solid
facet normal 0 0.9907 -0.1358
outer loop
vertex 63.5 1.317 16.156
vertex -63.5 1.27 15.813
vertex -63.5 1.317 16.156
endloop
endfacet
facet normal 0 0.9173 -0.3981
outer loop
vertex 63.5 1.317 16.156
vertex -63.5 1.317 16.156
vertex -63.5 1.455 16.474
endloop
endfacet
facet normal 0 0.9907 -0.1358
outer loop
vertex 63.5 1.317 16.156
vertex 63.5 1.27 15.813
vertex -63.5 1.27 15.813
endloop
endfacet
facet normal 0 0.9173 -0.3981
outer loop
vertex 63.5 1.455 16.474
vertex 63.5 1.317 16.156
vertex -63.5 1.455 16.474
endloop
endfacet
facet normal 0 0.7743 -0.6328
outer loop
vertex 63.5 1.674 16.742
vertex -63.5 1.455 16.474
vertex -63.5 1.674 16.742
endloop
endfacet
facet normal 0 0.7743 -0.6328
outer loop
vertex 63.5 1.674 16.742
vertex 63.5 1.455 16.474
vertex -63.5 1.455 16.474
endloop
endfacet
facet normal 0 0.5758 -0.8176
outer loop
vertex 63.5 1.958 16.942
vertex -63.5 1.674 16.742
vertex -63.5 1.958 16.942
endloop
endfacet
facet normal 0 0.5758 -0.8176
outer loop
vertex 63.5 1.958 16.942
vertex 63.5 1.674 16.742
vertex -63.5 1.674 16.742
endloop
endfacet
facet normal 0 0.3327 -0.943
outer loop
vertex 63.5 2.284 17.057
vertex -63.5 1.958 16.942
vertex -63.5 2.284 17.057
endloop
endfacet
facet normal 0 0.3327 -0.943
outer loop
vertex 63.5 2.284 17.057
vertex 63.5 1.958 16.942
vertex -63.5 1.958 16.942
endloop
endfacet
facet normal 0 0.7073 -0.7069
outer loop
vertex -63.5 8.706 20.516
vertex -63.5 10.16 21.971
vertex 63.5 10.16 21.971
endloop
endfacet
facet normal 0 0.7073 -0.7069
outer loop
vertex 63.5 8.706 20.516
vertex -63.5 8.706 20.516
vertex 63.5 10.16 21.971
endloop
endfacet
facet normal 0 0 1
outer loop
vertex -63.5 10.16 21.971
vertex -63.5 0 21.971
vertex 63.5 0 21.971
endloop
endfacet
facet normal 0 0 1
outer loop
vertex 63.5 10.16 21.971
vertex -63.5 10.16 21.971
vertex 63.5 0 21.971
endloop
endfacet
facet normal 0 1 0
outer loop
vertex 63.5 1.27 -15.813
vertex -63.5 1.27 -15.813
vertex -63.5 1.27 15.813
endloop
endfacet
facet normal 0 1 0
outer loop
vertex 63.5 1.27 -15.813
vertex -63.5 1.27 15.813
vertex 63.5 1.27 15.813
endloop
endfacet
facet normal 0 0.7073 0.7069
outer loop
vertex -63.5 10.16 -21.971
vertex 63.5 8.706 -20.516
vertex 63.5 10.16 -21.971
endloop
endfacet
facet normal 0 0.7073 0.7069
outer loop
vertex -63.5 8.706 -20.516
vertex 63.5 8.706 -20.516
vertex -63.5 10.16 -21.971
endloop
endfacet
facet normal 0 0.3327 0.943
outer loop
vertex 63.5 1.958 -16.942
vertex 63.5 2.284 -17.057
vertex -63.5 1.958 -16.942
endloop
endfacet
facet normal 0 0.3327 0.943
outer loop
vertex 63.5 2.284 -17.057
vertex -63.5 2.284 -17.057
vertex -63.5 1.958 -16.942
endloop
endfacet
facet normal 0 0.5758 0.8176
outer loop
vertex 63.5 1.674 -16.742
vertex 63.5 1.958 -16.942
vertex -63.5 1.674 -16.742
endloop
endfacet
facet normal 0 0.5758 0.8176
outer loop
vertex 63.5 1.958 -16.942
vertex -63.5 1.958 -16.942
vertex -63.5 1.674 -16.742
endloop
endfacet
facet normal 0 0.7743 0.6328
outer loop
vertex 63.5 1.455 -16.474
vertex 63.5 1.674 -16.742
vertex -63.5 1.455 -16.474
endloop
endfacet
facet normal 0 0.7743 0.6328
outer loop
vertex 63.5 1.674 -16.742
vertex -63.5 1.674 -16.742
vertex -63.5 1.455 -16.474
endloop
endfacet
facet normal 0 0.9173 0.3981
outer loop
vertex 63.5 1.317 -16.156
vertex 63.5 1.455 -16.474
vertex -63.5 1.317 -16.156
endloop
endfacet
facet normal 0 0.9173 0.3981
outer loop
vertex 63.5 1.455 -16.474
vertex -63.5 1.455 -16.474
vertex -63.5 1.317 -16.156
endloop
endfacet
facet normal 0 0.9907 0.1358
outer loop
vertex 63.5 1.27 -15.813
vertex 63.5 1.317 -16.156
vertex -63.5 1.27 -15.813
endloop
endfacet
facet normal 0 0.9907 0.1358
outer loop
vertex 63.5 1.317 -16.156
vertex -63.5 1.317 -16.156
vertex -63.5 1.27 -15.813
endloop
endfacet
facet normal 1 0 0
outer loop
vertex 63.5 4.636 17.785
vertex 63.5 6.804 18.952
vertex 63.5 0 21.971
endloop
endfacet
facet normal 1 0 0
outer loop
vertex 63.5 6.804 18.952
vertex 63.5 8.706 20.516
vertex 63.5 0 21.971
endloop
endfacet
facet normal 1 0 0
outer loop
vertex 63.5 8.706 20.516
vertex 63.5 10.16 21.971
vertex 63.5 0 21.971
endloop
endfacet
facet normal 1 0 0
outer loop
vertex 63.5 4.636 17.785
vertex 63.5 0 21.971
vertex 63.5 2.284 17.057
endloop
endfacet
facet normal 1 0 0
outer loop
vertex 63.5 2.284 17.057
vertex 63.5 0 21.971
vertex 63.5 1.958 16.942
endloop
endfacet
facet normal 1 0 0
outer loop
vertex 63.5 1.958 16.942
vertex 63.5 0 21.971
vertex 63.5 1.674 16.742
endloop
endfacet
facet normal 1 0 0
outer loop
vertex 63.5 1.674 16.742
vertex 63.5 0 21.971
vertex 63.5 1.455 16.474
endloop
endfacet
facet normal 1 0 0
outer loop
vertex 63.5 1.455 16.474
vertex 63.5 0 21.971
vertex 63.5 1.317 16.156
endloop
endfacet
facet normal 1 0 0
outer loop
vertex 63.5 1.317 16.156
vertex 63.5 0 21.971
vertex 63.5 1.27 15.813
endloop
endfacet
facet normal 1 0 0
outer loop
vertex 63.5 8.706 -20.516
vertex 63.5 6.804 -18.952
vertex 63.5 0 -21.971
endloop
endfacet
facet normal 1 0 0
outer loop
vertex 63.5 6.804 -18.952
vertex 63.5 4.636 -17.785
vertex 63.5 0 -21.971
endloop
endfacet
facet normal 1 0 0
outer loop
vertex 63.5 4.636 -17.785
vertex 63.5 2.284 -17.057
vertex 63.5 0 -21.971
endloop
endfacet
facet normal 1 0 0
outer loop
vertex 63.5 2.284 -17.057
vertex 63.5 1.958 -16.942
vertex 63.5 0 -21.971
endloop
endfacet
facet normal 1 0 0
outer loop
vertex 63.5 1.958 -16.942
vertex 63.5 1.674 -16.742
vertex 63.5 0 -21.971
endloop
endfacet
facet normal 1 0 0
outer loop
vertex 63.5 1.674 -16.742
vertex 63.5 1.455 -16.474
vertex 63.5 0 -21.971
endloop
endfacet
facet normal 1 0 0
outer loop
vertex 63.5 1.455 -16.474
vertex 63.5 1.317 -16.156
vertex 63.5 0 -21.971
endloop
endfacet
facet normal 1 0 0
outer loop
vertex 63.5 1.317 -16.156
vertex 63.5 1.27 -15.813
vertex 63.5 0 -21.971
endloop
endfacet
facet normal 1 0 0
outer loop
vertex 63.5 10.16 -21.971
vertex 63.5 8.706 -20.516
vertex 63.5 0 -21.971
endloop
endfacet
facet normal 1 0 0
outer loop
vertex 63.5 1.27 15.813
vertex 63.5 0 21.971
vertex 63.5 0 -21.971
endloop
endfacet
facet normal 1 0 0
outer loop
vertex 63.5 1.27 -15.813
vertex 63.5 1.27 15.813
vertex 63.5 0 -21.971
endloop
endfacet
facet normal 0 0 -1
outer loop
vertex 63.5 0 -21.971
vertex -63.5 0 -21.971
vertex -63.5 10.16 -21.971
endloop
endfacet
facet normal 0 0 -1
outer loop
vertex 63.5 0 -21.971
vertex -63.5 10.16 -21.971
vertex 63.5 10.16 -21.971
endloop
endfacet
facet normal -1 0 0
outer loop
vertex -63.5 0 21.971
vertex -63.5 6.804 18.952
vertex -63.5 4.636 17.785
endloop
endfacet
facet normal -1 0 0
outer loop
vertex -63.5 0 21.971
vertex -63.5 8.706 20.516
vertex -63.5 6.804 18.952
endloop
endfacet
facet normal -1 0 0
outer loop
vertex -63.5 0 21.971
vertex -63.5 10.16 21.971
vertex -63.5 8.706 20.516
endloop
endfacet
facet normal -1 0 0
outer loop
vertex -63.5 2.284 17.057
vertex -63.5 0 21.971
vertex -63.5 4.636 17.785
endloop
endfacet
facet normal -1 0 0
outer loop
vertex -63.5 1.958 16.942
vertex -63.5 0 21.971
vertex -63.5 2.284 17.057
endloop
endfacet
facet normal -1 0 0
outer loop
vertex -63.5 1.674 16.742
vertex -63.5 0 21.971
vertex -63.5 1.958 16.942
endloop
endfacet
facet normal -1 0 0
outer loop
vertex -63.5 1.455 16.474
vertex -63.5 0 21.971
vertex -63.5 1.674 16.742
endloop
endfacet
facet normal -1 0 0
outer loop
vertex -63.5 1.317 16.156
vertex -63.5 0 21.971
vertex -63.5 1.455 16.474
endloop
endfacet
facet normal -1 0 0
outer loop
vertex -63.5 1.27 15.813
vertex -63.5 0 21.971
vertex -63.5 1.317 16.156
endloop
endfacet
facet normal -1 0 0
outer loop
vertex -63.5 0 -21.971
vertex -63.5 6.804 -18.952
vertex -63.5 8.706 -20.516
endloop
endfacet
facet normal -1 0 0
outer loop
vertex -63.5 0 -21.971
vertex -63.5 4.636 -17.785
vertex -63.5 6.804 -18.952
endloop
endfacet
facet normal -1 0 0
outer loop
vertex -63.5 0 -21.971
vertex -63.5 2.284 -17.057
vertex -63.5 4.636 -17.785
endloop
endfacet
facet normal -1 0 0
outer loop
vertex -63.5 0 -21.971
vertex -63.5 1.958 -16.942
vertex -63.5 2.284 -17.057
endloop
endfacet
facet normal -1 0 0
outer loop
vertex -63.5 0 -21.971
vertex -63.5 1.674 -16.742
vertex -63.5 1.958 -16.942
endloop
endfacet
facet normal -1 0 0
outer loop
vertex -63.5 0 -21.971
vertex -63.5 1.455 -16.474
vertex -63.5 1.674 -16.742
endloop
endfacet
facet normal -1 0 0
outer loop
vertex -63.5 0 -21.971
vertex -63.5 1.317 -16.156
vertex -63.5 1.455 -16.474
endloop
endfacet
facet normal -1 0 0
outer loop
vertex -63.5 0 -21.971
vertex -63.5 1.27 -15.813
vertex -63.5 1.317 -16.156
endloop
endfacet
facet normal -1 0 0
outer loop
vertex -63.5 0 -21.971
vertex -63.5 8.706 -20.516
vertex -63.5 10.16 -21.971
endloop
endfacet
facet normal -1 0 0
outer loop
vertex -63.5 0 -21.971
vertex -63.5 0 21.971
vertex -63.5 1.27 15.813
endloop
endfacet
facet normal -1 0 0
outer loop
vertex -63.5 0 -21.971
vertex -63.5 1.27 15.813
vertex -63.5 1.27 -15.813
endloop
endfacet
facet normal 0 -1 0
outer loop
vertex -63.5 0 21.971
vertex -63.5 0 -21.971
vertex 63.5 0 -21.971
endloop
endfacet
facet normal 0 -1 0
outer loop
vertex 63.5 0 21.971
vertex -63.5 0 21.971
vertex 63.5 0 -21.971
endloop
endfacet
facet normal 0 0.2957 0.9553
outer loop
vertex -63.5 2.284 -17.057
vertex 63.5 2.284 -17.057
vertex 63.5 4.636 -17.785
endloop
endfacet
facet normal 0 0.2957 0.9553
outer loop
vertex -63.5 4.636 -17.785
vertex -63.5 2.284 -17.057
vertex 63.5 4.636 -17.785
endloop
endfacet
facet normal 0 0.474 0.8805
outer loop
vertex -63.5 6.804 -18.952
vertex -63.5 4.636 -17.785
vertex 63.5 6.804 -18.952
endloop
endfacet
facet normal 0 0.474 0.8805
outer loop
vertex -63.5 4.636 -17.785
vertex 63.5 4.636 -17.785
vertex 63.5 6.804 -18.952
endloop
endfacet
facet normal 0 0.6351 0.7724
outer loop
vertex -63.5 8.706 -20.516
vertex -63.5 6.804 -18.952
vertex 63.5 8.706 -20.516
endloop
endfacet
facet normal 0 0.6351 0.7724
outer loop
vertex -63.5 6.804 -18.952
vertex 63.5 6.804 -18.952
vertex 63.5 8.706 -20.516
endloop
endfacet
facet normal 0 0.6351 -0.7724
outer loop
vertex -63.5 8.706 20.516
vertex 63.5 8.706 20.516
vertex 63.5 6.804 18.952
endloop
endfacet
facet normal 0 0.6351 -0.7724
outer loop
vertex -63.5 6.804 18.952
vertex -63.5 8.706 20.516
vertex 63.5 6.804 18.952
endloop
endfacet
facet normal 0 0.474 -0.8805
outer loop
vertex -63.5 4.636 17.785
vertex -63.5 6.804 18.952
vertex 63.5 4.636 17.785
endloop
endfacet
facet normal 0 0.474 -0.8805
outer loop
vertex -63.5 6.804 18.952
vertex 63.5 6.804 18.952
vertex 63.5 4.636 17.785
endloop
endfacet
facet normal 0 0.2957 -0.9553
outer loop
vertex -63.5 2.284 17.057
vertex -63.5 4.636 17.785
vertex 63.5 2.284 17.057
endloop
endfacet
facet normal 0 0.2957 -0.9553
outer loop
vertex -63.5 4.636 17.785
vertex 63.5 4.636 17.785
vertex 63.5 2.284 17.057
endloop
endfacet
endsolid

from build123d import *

# Parameters (mm, degrees)
SKETCH1_W           = 127
SKETCH1_H           = 43.942
BOSS_EXTRUDE1_DEPTH = 10.16
SKETCH2_W           = 114.3
SKETCH2_H           = 33.782
SKETCH2_W_2         = 6.35
CUT_EXTRUDE1_DEPTH  = 8.89
CHAMFER1_SIZE       = 5.08
FILLET1_R           = 12.7
FILLET2_R           = 1.27


# Some blends are built 0.0001 mm under size
with BuildPart() as part:
    # Sketch1 → Boss-Extrude1 (new body)
    with BuildSketch(Plane(origin=(0, 0, 0), x_dir=(1, 0, 0), z_dir=(0, 1, 0))):
        Rectangle(SKETCH1_W, SKETCH1_H)
    extrude(amount=BOSS_EXTRUDE1_DEPTH)

    # Sketch2 → Cut-Extrude1 (cut)
    with BuildSketch(Plane(origin=(0, 10.16, 0), x_dir=(1, 0, 0), z_dir=(0, 1, 0))):
        Rectangle(SKETCH2_W, SKETCH2_H)
        with Locations((60.325, 0)):
            Rectangle(SKETCH2_W_2, SKETCH2_H)
        with Locations((-60.325, 0)):
            Rectangle(SKETCH2_W_2, SKETCH2_H)
    extrude(amount=-CUT_EXTRUDE1_DEPTH, mode=Mode.SUBTRACT)

    # Chamfer1
    chamfer1_edges = [part.edges().sort_by_distance(p)[0] for p in [
        (0, 10.16, 16.891),
        (0, 10.16, -16.891),
    ]]
    chamfer(chamfer1_edges, length=CHAMFER1_SIZE - 0.0001)  # a hair under: the kernel refuses the full size

    # Fillet1
    # the kernel refuses this fillet: 12.7 mm, written as the material it takes off along each edge
    with BuildSketch(Plane(origin=(76.317910379, 5.0801, 16.891), x_dir=(0, -1, 0), z_dir=(-1, 0, 0))) as fillet1_piece_1:
        with BuildLine():
            CenterArc((5.354803581, 12.605708661), FILLET1_R, 225, 38.013804416)
            Line((-3.62545254, 3.62545254), (-3.805057662, 3.445847418))
            Line((-3.805057662, 3.445847418), (-0.179605122, -0.179605122))
            Line((-0.179605122, -0.179605122), (0, -0.254))
            ThreePointArc((0, -0.254), (1.90505, -0.254), (3.779205928, -0.252114173))
            Line((3.779205928, -0.252114173), (3.8101, 0))
        make_face()
    extrude(amount=152.635820759, mode=Mode.SUBTRACT)
    with BuildSketch(Plane(origin=(76.317910379, 5.0801, -16.891), x_dir=(0, 0.7071067811865474, -0.7071067811865477), z_dir=(-1, 0, 0))) as fillet1_piece_2:
        with BuildLine():
            CenterArc((5.127164152, 12.7), FILLET1_R, 231.986195584, 38.013804416)
            Line((-2.694147547, 2.694147547), (-2.850573781, 2.494030498))
            ThreePointArc((-2.850573781, 2.494030498), (-1.526678896, 1.167468651), (-0.179605122, -0.179605122))
            Line((-0.179605122, -0.179605122), (0, -0.254))
            Line((0, -0.254), (5.127164152, -0.254))
            Line((5.127164152, -0.254), (5.127164152, 0))
        make_face()
    extrude(amount=152.635820759, mode=Mode.SUBTRACT)

    # Fillet2
    fillet2_edges = [part.edges().sort_by_distance(p)[0] for p in [
        (0, 1.27, 16.891),
        (0, 1.27, -16.891),
    ]]
    fillet(fillet2_edges, radius=FILLET2_R)


solid = part.part
